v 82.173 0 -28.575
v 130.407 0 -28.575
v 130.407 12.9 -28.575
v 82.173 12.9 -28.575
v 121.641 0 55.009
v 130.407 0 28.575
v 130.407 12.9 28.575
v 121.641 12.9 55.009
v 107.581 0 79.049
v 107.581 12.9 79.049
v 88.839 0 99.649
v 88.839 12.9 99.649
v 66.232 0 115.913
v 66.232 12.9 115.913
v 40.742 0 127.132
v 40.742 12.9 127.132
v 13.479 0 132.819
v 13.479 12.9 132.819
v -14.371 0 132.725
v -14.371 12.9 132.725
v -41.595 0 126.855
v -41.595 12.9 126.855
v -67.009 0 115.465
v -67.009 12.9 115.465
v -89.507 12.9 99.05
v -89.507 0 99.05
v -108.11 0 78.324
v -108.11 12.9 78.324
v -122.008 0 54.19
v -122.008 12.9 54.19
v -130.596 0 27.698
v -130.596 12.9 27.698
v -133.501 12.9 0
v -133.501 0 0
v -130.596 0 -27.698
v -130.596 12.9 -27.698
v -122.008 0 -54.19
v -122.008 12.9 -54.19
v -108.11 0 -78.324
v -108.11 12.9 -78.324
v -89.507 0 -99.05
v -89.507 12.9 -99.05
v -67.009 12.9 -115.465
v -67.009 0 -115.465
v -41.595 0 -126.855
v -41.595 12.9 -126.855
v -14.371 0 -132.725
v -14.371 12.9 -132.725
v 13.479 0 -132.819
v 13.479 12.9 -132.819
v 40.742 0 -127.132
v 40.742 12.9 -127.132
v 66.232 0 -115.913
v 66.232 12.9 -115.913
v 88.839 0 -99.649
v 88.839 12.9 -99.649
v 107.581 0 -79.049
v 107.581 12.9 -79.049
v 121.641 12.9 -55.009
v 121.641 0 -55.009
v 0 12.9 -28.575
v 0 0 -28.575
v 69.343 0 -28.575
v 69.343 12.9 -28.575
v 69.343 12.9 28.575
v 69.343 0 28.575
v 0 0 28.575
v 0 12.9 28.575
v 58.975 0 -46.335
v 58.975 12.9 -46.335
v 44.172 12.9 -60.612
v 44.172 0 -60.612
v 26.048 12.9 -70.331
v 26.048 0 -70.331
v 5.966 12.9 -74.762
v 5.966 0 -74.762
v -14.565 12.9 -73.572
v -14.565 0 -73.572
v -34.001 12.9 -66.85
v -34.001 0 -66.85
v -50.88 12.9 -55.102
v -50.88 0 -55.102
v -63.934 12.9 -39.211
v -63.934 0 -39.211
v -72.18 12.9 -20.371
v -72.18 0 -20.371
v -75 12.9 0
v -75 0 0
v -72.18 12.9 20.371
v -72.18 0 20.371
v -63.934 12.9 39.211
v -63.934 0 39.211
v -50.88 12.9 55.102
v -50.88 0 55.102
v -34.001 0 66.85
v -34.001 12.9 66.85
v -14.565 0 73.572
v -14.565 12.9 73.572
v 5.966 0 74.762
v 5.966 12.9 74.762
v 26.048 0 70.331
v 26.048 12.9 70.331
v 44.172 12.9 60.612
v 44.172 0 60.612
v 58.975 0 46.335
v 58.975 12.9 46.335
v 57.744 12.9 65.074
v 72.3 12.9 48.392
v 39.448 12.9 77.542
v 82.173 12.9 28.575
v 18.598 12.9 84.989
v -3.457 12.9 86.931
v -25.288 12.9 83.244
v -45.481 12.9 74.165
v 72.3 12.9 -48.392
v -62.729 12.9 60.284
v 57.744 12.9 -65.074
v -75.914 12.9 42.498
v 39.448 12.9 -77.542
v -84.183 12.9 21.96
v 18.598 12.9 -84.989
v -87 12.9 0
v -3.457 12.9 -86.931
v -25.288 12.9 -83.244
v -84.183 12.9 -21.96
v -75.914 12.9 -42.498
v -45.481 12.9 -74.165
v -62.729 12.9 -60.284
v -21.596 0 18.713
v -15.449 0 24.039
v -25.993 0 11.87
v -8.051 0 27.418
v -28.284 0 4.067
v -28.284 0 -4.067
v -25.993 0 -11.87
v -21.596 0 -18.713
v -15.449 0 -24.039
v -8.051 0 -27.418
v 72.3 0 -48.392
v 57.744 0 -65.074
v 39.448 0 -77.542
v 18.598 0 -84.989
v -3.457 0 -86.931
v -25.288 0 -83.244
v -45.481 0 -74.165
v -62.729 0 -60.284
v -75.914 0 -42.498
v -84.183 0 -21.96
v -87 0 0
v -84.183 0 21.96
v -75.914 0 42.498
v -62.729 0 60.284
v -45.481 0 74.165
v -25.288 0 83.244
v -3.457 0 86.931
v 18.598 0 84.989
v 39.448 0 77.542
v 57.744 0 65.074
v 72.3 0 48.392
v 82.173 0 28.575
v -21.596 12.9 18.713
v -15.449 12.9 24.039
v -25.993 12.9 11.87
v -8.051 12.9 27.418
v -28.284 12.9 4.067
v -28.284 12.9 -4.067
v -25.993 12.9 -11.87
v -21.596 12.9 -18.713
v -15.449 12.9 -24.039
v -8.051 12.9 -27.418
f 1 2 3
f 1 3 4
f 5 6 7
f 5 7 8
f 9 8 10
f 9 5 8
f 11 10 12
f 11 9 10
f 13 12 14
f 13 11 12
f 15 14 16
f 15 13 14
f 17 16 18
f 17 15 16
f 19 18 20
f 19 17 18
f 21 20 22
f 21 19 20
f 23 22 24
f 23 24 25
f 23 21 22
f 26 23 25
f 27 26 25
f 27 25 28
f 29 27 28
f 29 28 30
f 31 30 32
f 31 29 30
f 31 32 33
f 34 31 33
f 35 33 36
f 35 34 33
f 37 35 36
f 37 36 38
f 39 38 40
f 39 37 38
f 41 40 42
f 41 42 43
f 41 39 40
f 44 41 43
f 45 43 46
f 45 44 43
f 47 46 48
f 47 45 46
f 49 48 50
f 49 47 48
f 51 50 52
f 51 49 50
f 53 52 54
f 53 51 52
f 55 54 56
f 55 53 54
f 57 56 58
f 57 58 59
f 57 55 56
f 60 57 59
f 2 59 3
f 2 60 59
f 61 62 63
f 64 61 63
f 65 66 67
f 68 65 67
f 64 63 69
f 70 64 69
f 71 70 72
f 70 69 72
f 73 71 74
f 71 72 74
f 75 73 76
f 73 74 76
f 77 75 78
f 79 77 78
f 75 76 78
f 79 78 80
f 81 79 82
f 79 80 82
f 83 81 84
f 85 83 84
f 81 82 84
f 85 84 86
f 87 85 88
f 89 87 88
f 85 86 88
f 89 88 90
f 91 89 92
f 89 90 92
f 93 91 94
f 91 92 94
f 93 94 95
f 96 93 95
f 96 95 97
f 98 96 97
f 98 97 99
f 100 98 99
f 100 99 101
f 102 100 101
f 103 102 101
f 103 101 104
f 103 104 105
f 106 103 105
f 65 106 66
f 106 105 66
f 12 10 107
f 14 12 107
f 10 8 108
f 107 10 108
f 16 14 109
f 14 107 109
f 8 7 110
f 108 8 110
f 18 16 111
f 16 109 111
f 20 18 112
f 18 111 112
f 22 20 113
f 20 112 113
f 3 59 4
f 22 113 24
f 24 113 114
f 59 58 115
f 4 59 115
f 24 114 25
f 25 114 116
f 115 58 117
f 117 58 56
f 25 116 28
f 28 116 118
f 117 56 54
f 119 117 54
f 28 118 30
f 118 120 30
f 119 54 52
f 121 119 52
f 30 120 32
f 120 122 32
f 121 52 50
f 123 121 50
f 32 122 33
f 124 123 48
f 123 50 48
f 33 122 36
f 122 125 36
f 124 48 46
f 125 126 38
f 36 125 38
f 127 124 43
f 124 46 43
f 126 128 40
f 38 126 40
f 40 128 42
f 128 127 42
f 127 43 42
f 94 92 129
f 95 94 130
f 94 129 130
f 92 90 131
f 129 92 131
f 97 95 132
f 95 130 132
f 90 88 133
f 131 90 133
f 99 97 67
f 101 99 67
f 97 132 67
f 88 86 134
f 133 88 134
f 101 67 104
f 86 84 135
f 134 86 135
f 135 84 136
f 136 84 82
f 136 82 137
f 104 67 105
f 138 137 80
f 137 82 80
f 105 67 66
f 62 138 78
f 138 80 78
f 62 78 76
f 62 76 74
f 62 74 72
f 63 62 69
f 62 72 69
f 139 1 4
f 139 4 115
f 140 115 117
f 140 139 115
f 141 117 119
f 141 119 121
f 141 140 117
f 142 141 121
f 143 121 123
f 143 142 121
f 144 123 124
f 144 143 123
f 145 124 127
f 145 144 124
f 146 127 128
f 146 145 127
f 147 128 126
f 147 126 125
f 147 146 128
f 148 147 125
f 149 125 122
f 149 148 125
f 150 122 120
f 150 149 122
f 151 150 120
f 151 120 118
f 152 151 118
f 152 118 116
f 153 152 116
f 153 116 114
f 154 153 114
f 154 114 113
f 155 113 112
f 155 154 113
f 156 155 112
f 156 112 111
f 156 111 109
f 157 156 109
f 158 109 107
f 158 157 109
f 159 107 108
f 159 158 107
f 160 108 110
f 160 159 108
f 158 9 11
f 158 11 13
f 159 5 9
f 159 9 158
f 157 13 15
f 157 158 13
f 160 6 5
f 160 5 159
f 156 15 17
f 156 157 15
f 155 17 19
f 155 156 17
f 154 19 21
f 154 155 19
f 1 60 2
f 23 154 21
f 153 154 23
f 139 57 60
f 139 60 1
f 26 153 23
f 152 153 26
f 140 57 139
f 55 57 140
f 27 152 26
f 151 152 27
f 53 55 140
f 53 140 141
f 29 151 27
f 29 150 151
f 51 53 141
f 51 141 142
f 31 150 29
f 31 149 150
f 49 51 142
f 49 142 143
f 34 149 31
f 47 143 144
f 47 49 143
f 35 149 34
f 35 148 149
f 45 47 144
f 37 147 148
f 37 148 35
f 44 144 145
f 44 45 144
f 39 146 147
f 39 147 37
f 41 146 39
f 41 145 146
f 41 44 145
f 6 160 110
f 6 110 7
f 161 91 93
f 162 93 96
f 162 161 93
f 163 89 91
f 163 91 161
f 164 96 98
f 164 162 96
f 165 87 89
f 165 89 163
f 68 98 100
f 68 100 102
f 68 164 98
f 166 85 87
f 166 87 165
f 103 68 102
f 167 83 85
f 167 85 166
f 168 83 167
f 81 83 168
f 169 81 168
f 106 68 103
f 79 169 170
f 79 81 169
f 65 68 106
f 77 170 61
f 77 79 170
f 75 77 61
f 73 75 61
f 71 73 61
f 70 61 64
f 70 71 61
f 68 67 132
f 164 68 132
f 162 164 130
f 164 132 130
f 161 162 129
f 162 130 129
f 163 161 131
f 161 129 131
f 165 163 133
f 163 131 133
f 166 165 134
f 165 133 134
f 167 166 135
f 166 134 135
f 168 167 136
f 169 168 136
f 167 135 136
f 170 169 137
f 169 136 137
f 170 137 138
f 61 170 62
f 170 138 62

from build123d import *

# Parameters (mm, degrees)
BOSS_EXTRUDE1_DEPTH = 12.9
BOSS_EXTRUDE2_DEPTH = 12.9


with BuildPart() as part:
    # Sketch1 → Boss-Extrude1 (new body)
    with BuildSketch(Plane(origin=(0, 0, 0), x_dir=(1, 0, 0), z_dir=(0, 1, 0))):
        with BuildLine():
            Line((0, 28.575), (69.343127814, 28.575))
            ThreePointArc((69.343127814, 28.575), (-75, 0), (69.343127814, -28.575))
            Line((69.343127814, -28.575), (0, -28.575))
            ThreePointArc((0, -28.575), (-28.575, 0), (0, 28.575))
        make_face()
    extrude(amount=BOSS_EXTRUDE1_DEPTH)


with BuildPart() as body_2:
    # Sketch1<21> → Boss-Extrude2 (new body)
    with BuildSketch(Plane(origin=(0, 0, 0), x_dir=(1, 0, 0), z_dir=(0, 1, 0))):
        with BuildLine():
            Line((82.173411936, -28.575), (130.406718206, -28.575))
            ThreePointArc((130.406718206, -28.575), (-133.500722014, 0), (130.406718206, 28.575))
            Line((130.406718206, 28.575), (82.173411936, 28.575))
            ThreePointArc((82.173411936, 28.575), (-87.000001461, 0), (82.173411936, -28.575))
        make_face()
    extrude(amount=BOSS_EXTRUDE2_DEPTH)


solid = Compound([part.part, body_2.part])
